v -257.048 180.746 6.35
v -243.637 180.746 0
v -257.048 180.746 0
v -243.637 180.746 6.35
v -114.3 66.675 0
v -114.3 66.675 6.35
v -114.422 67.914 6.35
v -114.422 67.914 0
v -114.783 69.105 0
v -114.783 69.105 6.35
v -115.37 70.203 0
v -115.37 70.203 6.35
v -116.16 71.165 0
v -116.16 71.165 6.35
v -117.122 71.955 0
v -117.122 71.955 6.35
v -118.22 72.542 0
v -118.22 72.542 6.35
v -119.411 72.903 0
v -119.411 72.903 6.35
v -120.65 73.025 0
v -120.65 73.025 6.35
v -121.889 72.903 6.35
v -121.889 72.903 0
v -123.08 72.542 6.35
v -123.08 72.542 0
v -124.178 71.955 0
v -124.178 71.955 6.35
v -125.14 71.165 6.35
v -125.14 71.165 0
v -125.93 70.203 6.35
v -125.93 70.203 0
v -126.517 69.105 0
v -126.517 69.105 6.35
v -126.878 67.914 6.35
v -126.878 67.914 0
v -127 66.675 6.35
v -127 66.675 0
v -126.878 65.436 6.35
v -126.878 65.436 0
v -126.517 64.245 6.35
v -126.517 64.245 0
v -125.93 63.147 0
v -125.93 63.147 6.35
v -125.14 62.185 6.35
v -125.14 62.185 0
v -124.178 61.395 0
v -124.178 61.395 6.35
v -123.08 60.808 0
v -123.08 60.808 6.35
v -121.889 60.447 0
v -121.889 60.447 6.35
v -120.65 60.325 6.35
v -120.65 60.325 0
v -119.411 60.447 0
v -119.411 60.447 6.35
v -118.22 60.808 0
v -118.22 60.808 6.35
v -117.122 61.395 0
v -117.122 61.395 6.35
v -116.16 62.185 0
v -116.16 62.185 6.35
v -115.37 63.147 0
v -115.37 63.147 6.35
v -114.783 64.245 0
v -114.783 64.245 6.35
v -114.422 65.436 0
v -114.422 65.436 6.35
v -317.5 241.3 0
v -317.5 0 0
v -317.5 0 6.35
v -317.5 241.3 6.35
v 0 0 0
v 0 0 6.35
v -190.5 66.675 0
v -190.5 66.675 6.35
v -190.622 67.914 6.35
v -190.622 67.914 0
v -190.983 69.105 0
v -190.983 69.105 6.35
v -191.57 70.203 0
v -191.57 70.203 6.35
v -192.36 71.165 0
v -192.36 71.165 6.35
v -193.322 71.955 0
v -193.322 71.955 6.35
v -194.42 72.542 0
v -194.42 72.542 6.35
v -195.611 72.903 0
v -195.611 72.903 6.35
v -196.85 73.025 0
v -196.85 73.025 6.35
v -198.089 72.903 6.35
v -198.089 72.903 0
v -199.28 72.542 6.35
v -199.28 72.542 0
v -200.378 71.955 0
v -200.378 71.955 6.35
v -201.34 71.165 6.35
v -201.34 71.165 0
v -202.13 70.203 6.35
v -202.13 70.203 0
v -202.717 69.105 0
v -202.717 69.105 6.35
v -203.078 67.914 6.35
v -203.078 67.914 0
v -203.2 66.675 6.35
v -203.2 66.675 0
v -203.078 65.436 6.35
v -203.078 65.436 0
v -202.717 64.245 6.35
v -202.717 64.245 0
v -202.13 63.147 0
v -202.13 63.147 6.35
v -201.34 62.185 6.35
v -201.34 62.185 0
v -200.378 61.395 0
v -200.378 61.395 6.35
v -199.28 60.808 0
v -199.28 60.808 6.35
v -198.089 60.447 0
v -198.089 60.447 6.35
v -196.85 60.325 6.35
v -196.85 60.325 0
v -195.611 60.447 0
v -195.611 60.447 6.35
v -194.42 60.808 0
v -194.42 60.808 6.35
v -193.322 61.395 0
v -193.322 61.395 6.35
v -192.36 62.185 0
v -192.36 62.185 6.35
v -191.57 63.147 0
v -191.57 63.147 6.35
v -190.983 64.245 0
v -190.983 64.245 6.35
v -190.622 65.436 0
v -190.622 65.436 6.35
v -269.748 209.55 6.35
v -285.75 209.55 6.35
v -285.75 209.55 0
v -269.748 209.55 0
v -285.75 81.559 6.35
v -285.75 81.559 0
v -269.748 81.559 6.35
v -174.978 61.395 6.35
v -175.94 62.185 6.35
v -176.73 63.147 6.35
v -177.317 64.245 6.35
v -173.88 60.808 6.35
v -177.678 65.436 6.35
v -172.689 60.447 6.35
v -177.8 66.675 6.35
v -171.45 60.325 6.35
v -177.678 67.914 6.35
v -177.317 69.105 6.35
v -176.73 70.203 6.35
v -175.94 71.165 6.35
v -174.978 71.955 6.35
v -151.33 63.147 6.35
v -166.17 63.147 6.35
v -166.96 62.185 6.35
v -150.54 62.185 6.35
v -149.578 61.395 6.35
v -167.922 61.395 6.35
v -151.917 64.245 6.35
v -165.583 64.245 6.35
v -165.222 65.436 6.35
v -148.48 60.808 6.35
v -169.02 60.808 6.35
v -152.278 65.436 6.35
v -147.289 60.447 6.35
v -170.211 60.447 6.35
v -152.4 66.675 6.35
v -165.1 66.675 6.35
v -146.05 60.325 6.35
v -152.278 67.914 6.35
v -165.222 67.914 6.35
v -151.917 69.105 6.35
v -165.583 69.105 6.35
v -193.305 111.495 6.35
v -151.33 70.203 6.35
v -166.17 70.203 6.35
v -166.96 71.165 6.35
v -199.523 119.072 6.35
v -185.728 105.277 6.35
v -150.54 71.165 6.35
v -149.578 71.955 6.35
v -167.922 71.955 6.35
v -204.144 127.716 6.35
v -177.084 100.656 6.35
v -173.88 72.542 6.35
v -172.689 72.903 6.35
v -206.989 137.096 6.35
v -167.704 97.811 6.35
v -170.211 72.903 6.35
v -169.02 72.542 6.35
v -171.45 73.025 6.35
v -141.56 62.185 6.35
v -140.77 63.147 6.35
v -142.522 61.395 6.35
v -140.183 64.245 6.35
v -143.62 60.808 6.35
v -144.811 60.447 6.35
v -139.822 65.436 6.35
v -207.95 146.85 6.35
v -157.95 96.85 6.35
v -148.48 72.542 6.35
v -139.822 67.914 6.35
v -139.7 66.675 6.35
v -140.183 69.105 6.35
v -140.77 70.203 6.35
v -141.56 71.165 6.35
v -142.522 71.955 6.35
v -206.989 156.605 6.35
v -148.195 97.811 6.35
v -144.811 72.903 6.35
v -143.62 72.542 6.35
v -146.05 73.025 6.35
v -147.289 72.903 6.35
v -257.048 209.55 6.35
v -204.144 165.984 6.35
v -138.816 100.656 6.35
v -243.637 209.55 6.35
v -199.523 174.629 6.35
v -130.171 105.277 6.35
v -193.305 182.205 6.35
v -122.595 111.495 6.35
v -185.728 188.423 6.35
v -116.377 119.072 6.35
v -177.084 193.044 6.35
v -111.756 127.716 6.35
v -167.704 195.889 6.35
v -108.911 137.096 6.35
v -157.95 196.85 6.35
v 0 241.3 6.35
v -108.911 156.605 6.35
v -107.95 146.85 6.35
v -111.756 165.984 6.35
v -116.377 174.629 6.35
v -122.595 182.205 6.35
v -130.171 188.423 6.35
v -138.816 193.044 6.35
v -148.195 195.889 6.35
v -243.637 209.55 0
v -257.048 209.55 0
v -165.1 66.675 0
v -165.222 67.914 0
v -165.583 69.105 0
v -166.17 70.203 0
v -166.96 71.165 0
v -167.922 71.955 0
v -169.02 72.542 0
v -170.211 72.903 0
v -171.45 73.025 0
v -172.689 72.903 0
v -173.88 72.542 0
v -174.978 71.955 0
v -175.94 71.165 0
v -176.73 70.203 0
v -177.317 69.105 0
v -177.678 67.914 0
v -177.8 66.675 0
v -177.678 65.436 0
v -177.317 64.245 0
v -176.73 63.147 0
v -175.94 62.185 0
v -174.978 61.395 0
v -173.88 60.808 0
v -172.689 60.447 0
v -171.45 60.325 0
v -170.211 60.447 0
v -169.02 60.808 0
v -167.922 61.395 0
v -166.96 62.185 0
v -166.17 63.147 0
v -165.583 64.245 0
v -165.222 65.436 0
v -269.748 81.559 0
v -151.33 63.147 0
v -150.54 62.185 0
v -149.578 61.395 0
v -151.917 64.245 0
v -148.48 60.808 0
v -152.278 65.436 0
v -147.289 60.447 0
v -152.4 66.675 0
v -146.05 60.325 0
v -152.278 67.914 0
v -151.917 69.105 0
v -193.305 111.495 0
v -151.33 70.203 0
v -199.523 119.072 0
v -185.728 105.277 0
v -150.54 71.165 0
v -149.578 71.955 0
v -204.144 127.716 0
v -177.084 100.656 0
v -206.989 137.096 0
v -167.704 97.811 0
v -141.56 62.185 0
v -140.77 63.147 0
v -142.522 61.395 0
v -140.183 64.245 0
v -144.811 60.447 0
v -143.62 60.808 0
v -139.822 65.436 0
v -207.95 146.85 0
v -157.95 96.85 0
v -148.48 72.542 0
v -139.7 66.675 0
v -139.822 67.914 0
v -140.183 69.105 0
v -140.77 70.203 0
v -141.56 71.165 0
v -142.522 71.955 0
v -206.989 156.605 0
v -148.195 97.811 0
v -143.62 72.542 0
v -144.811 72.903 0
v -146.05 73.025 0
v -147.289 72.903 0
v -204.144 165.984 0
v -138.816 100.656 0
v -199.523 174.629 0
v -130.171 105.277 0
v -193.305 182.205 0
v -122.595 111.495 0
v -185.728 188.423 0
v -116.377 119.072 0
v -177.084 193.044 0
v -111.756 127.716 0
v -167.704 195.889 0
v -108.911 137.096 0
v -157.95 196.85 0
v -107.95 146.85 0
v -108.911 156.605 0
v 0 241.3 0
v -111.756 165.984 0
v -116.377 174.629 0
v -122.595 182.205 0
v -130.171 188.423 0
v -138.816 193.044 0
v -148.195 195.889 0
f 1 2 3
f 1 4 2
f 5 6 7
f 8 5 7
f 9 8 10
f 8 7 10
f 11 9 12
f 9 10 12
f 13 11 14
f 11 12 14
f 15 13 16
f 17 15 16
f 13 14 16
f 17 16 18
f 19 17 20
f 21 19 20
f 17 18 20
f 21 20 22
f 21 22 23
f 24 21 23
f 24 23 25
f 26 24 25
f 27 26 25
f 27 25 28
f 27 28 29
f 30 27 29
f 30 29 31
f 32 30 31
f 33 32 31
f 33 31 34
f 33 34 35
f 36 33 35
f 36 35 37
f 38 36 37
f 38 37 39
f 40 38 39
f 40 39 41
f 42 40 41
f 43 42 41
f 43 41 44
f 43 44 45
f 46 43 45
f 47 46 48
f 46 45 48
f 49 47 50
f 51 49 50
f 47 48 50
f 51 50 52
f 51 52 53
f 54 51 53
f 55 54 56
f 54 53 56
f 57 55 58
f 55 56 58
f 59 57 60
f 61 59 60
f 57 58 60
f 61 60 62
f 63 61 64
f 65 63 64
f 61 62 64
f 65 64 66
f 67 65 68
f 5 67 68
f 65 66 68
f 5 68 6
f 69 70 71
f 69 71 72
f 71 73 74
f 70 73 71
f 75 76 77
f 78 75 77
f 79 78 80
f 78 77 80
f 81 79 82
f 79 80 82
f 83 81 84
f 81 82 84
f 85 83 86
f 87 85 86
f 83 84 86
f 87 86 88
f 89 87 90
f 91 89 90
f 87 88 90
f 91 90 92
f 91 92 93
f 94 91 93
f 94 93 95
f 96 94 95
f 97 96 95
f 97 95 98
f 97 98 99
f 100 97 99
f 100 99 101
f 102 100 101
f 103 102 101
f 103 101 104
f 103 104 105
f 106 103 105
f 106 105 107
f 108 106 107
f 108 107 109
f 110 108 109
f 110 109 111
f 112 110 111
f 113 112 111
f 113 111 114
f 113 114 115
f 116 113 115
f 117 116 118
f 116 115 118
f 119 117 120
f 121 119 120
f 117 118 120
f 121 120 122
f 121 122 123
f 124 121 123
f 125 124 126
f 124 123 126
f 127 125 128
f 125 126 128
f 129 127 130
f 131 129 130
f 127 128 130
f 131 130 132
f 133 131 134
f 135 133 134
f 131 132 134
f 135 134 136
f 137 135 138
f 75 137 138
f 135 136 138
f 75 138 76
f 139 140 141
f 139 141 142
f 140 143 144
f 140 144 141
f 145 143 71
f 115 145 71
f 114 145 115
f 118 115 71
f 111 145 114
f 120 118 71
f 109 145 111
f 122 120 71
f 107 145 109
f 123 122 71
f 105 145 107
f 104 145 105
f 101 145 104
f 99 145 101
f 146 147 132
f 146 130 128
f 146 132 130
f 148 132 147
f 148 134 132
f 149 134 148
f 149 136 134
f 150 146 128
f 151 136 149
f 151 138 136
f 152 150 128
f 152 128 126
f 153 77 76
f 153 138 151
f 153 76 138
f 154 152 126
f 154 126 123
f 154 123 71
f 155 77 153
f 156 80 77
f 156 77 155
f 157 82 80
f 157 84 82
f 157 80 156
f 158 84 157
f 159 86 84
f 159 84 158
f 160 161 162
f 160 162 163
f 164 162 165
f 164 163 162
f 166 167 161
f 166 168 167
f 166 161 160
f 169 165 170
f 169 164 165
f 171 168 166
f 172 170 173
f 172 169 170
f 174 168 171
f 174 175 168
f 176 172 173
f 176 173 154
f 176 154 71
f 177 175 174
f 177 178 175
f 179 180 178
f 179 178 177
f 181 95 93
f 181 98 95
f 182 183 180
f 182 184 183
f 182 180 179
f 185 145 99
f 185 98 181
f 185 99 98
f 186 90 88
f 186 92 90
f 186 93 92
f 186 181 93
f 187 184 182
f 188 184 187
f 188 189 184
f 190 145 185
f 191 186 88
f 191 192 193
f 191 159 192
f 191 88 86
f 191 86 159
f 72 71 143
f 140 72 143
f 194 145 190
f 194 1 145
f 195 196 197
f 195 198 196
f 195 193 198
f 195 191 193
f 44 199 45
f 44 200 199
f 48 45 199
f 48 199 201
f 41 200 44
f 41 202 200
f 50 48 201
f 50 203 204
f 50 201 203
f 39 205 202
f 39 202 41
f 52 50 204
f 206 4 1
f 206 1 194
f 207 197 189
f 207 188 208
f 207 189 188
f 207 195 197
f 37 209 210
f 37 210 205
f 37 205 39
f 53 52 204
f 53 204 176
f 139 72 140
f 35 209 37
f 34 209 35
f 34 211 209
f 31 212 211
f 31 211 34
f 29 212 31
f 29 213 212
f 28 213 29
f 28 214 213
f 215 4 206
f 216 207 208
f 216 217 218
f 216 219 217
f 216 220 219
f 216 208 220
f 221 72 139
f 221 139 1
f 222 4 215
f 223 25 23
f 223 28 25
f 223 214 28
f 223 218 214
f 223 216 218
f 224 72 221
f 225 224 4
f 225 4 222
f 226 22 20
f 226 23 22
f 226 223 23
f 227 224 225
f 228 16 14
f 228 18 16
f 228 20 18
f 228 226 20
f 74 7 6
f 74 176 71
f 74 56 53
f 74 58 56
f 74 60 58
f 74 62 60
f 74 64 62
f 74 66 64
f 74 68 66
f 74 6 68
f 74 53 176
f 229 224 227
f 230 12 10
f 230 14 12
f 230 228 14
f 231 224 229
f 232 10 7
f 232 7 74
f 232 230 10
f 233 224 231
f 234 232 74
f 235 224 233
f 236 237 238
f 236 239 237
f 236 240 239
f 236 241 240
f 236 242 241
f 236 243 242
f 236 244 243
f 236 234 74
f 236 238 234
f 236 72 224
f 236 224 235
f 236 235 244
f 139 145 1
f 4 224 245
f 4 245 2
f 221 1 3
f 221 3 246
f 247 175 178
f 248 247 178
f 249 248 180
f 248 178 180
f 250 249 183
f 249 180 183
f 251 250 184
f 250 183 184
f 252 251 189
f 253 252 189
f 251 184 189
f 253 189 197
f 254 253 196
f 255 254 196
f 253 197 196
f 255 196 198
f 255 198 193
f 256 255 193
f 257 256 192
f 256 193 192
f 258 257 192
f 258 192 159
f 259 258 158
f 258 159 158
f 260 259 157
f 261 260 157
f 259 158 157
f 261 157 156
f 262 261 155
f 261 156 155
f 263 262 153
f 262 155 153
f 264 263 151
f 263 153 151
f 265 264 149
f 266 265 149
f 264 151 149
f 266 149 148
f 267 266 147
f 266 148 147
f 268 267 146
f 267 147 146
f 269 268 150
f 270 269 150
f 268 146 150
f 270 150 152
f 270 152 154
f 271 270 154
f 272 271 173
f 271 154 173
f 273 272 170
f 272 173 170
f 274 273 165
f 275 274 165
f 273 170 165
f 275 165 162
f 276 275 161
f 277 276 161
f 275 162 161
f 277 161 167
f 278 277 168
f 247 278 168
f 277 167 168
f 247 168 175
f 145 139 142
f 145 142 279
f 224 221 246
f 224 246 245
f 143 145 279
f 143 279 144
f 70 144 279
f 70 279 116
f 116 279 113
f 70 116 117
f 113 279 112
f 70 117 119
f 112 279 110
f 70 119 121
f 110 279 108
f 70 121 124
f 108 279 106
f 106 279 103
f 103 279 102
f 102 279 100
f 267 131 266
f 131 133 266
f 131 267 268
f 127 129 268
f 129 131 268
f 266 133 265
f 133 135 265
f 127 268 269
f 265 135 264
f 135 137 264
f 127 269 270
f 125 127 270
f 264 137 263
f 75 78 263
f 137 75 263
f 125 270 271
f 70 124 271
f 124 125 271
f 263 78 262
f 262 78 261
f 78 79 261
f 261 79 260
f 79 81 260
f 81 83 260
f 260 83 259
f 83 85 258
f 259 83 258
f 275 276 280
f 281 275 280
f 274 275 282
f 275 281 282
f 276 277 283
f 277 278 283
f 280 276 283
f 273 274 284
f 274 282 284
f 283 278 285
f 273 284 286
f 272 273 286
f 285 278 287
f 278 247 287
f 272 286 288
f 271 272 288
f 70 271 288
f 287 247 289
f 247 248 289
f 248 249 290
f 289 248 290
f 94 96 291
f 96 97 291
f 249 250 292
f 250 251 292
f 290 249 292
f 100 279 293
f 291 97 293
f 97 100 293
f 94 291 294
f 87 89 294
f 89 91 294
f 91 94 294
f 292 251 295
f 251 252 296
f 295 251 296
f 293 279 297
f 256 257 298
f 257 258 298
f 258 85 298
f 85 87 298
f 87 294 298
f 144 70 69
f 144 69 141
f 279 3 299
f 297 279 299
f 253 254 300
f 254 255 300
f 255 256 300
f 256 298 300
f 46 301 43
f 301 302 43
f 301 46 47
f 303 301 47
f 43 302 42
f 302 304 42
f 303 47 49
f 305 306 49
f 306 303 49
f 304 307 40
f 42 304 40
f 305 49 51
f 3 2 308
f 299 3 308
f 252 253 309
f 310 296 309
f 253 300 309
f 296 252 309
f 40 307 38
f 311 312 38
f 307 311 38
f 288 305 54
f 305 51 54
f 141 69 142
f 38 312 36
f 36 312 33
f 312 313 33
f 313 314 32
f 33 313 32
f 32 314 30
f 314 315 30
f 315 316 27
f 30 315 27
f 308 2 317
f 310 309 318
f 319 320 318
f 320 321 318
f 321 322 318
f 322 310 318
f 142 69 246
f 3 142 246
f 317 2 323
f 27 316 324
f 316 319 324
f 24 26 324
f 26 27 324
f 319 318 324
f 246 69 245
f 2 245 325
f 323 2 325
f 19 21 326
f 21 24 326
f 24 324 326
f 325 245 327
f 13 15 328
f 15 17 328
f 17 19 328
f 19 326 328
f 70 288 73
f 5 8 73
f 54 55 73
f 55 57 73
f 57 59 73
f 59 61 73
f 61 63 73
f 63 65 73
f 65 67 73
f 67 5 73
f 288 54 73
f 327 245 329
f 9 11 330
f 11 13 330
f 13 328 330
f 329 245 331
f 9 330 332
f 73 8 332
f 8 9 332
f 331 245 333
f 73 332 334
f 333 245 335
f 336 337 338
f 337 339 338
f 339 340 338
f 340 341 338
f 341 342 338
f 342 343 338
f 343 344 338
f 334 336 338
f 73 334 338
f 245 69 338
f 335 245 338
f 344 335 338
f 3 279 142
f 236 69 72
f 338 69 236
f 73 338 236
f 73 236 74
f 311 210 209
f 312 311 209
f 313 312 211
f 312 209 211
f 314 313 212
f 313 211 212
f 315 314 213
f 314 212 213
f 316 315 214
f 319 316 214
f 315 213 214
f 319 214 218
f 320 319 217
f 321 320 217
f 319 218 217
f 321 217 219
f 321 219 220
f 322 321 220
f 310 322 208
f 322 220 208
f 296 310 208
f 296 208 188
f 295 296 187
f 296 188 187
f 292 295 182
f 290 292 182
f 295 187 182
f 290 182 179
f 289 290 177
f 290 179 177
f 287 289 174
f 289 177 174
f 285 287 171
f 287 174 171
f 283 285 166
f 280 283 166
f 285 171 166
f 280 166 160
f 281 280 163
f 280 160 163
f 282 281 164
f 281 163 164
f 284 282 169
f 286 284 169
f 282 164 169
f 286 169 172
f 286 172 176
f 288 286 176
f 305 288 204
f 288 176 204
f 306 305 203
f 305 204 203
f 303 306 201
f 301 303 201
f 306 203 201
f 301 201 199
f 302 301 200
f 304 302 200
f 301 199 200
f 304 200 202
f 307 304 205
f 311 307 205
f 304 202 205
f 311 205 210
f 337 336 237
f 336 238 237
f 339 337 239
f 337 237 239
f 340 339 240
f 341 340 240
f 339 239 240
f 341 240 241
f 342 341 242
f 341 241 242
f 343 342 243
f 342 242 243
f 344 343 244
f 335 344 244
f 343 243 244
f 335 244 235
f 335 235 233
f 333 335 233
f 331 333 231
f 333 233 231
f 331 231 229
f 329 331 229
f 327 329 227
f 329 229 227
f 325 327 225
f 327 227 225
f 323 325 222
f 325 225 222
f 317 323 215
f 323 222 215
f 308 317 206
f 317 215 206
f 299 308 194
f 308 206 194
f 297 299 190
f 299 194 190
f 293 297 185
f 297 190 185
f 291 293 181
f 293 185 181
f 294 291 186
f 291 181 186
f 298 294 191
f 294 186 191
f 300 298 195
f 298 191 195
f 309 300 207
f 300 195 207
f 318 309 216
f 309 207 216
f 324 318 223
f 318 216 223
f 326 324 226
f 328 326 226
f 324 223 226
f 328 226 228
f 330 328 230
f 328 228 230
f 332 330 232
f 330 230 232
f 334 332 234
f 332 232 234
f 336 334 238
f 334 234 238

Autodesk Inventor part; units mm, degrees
ref_plane "YZ Plane" through (0, 0, 0) normal (1, 0, 0) x (0, 1, 0)
ref_plane "XZ Plane" through (0, 0, 0) normal (0, 1, 0) x (-1, 0, 0)
ref_plane "XY Plane" through (0, 0, 0) normal (0, 0, 1) x (1, 0, 0)
sketch "Sketch1" plane through (0, 0, 0) normal (0, 0, 1) x (1, 0, 0)
  line L0 (-317.5, 241.3) -> (0, 241.3)
  line L1 (0, 241.3) -> (0, 0)
  line L2 (0, 0) -> (-317.5, 0)
  line L3 (-317.5, 0) -> (-317.5, 241.3)
  dimension "d0" = 317.5
  dimension "d1" = 241.3
extrude "Extrusion1" add sketch "Sketch1" along normal blind 6.35
sketch "Sketch2" plane through (0, 0, 6.35) normal (0, 0, 1) x (1, 0, 0)
  circle A0 centre (-120.65, 66.675) radius 6.35
  line L0 (-317.5, 0) -> (0, 0) projected
  line L1 (0, 0) -> (0, 241.3) projected
  circle A1 centre (-196.85, 66.675) radius 6.35
  line L2 (-317.5, 241.3) -> (-317.5, 0) projected
  circle A2 centre (-171.45, 66.675) radius 6.35
  circle A3 centre (-146.05, 66.675) radius 6.35
  dimension "d4" = 12.7
  dimension "d5" = 66.675
  dimension "d7" = 12.7
  dimension "d8" = 66.675
  dimension "d10" = 12.7
  dimension "d11" = 12.7
  dimension "d12" = 66.675
  dimension "d13" = 66.675
  dimension "d20" = 114.3
  dimension "d21" = 114.3
  dimension "d26" = 12.7
  dimension "d27" = 12.7
extrude "Extrusion2" cut sketch "Sketch2" against normal blind 6.35
sketch "Sketch3" plane through (0, 0, 6.35) normal (0, 0, 1) x (1, 0, 0)
  circle A0 centre (-157.9499, 146.8501) radius 49.9999
  line L0 (0, 0) -> (0, 241.3) projected
  line L1 (0, 241.3) -> (-317.5, 241.3) projected
  dimension "d28" = 99.9998
  dimension "d29" = 107.95
  dimension "d30" = 44.45
extrude "Extrusion3" cut sketch "Sketch3" against normal blind 6.35
sketch "Sketch4" plane through (0, 0, 6.35) normal (0, 0, 1) x (1, 0, 0)
  line L0 (-285.75, 209.55) -> (-269.748, 209.55)
  line L1 (-269.748, 209.55) -> (-269.748, 81.5594)
  line L2 (-269.748, 81.5594) -> (-285.75, 81.5594)
  line L3 (-285.75, 81.5594) -> (-285.75, 209.55)
  line L4 (-317.5, 241.3) -> (-317.5, 0) projected
  line L5 (0, 241.3) -> (-317.5, 241.3) projected
  point P0 (0, 0)
  dimension "d33" = 31.75
  dimension "d34" = 31.75
  dimension "d35" = 16.002
  dimension "d36" = 127.9906
extrude "Extrusion4" cut sketch "Sketch4" against normal blind 6.35
sketch "Sketch5" plane through (0, 0, 6.35) normal (0, 0, 1) x (1, 0, 0)
  line L0 (-257.048, 209.55) -> (-243.6368, 209.55)
  line L1 (-243.6368, 209.55) -> (-243.6368, 180.7464)
  line L2 (-243.6368, 180.7464) -> (-257.048, 180.7464)
  line L3 (-257.048, 180.7464) -> (-257.048, 209.55)
  line L4 (-269.748, 209.55) -> (-269.748, 81.5594) projected
  line L5 (0, 241.3) -> (-317.5, 241.3) projected
  point P0 (0, 0)
  dimension "d39" = 12.7
  dimension "d40" = 31.75
  dimension "d41" = 13.4112
  dimension "d42" = 28.8036
extrude "Extrusion5" cut sketch "Sketch5" against normal blind 6.35
properties part number "Base"
